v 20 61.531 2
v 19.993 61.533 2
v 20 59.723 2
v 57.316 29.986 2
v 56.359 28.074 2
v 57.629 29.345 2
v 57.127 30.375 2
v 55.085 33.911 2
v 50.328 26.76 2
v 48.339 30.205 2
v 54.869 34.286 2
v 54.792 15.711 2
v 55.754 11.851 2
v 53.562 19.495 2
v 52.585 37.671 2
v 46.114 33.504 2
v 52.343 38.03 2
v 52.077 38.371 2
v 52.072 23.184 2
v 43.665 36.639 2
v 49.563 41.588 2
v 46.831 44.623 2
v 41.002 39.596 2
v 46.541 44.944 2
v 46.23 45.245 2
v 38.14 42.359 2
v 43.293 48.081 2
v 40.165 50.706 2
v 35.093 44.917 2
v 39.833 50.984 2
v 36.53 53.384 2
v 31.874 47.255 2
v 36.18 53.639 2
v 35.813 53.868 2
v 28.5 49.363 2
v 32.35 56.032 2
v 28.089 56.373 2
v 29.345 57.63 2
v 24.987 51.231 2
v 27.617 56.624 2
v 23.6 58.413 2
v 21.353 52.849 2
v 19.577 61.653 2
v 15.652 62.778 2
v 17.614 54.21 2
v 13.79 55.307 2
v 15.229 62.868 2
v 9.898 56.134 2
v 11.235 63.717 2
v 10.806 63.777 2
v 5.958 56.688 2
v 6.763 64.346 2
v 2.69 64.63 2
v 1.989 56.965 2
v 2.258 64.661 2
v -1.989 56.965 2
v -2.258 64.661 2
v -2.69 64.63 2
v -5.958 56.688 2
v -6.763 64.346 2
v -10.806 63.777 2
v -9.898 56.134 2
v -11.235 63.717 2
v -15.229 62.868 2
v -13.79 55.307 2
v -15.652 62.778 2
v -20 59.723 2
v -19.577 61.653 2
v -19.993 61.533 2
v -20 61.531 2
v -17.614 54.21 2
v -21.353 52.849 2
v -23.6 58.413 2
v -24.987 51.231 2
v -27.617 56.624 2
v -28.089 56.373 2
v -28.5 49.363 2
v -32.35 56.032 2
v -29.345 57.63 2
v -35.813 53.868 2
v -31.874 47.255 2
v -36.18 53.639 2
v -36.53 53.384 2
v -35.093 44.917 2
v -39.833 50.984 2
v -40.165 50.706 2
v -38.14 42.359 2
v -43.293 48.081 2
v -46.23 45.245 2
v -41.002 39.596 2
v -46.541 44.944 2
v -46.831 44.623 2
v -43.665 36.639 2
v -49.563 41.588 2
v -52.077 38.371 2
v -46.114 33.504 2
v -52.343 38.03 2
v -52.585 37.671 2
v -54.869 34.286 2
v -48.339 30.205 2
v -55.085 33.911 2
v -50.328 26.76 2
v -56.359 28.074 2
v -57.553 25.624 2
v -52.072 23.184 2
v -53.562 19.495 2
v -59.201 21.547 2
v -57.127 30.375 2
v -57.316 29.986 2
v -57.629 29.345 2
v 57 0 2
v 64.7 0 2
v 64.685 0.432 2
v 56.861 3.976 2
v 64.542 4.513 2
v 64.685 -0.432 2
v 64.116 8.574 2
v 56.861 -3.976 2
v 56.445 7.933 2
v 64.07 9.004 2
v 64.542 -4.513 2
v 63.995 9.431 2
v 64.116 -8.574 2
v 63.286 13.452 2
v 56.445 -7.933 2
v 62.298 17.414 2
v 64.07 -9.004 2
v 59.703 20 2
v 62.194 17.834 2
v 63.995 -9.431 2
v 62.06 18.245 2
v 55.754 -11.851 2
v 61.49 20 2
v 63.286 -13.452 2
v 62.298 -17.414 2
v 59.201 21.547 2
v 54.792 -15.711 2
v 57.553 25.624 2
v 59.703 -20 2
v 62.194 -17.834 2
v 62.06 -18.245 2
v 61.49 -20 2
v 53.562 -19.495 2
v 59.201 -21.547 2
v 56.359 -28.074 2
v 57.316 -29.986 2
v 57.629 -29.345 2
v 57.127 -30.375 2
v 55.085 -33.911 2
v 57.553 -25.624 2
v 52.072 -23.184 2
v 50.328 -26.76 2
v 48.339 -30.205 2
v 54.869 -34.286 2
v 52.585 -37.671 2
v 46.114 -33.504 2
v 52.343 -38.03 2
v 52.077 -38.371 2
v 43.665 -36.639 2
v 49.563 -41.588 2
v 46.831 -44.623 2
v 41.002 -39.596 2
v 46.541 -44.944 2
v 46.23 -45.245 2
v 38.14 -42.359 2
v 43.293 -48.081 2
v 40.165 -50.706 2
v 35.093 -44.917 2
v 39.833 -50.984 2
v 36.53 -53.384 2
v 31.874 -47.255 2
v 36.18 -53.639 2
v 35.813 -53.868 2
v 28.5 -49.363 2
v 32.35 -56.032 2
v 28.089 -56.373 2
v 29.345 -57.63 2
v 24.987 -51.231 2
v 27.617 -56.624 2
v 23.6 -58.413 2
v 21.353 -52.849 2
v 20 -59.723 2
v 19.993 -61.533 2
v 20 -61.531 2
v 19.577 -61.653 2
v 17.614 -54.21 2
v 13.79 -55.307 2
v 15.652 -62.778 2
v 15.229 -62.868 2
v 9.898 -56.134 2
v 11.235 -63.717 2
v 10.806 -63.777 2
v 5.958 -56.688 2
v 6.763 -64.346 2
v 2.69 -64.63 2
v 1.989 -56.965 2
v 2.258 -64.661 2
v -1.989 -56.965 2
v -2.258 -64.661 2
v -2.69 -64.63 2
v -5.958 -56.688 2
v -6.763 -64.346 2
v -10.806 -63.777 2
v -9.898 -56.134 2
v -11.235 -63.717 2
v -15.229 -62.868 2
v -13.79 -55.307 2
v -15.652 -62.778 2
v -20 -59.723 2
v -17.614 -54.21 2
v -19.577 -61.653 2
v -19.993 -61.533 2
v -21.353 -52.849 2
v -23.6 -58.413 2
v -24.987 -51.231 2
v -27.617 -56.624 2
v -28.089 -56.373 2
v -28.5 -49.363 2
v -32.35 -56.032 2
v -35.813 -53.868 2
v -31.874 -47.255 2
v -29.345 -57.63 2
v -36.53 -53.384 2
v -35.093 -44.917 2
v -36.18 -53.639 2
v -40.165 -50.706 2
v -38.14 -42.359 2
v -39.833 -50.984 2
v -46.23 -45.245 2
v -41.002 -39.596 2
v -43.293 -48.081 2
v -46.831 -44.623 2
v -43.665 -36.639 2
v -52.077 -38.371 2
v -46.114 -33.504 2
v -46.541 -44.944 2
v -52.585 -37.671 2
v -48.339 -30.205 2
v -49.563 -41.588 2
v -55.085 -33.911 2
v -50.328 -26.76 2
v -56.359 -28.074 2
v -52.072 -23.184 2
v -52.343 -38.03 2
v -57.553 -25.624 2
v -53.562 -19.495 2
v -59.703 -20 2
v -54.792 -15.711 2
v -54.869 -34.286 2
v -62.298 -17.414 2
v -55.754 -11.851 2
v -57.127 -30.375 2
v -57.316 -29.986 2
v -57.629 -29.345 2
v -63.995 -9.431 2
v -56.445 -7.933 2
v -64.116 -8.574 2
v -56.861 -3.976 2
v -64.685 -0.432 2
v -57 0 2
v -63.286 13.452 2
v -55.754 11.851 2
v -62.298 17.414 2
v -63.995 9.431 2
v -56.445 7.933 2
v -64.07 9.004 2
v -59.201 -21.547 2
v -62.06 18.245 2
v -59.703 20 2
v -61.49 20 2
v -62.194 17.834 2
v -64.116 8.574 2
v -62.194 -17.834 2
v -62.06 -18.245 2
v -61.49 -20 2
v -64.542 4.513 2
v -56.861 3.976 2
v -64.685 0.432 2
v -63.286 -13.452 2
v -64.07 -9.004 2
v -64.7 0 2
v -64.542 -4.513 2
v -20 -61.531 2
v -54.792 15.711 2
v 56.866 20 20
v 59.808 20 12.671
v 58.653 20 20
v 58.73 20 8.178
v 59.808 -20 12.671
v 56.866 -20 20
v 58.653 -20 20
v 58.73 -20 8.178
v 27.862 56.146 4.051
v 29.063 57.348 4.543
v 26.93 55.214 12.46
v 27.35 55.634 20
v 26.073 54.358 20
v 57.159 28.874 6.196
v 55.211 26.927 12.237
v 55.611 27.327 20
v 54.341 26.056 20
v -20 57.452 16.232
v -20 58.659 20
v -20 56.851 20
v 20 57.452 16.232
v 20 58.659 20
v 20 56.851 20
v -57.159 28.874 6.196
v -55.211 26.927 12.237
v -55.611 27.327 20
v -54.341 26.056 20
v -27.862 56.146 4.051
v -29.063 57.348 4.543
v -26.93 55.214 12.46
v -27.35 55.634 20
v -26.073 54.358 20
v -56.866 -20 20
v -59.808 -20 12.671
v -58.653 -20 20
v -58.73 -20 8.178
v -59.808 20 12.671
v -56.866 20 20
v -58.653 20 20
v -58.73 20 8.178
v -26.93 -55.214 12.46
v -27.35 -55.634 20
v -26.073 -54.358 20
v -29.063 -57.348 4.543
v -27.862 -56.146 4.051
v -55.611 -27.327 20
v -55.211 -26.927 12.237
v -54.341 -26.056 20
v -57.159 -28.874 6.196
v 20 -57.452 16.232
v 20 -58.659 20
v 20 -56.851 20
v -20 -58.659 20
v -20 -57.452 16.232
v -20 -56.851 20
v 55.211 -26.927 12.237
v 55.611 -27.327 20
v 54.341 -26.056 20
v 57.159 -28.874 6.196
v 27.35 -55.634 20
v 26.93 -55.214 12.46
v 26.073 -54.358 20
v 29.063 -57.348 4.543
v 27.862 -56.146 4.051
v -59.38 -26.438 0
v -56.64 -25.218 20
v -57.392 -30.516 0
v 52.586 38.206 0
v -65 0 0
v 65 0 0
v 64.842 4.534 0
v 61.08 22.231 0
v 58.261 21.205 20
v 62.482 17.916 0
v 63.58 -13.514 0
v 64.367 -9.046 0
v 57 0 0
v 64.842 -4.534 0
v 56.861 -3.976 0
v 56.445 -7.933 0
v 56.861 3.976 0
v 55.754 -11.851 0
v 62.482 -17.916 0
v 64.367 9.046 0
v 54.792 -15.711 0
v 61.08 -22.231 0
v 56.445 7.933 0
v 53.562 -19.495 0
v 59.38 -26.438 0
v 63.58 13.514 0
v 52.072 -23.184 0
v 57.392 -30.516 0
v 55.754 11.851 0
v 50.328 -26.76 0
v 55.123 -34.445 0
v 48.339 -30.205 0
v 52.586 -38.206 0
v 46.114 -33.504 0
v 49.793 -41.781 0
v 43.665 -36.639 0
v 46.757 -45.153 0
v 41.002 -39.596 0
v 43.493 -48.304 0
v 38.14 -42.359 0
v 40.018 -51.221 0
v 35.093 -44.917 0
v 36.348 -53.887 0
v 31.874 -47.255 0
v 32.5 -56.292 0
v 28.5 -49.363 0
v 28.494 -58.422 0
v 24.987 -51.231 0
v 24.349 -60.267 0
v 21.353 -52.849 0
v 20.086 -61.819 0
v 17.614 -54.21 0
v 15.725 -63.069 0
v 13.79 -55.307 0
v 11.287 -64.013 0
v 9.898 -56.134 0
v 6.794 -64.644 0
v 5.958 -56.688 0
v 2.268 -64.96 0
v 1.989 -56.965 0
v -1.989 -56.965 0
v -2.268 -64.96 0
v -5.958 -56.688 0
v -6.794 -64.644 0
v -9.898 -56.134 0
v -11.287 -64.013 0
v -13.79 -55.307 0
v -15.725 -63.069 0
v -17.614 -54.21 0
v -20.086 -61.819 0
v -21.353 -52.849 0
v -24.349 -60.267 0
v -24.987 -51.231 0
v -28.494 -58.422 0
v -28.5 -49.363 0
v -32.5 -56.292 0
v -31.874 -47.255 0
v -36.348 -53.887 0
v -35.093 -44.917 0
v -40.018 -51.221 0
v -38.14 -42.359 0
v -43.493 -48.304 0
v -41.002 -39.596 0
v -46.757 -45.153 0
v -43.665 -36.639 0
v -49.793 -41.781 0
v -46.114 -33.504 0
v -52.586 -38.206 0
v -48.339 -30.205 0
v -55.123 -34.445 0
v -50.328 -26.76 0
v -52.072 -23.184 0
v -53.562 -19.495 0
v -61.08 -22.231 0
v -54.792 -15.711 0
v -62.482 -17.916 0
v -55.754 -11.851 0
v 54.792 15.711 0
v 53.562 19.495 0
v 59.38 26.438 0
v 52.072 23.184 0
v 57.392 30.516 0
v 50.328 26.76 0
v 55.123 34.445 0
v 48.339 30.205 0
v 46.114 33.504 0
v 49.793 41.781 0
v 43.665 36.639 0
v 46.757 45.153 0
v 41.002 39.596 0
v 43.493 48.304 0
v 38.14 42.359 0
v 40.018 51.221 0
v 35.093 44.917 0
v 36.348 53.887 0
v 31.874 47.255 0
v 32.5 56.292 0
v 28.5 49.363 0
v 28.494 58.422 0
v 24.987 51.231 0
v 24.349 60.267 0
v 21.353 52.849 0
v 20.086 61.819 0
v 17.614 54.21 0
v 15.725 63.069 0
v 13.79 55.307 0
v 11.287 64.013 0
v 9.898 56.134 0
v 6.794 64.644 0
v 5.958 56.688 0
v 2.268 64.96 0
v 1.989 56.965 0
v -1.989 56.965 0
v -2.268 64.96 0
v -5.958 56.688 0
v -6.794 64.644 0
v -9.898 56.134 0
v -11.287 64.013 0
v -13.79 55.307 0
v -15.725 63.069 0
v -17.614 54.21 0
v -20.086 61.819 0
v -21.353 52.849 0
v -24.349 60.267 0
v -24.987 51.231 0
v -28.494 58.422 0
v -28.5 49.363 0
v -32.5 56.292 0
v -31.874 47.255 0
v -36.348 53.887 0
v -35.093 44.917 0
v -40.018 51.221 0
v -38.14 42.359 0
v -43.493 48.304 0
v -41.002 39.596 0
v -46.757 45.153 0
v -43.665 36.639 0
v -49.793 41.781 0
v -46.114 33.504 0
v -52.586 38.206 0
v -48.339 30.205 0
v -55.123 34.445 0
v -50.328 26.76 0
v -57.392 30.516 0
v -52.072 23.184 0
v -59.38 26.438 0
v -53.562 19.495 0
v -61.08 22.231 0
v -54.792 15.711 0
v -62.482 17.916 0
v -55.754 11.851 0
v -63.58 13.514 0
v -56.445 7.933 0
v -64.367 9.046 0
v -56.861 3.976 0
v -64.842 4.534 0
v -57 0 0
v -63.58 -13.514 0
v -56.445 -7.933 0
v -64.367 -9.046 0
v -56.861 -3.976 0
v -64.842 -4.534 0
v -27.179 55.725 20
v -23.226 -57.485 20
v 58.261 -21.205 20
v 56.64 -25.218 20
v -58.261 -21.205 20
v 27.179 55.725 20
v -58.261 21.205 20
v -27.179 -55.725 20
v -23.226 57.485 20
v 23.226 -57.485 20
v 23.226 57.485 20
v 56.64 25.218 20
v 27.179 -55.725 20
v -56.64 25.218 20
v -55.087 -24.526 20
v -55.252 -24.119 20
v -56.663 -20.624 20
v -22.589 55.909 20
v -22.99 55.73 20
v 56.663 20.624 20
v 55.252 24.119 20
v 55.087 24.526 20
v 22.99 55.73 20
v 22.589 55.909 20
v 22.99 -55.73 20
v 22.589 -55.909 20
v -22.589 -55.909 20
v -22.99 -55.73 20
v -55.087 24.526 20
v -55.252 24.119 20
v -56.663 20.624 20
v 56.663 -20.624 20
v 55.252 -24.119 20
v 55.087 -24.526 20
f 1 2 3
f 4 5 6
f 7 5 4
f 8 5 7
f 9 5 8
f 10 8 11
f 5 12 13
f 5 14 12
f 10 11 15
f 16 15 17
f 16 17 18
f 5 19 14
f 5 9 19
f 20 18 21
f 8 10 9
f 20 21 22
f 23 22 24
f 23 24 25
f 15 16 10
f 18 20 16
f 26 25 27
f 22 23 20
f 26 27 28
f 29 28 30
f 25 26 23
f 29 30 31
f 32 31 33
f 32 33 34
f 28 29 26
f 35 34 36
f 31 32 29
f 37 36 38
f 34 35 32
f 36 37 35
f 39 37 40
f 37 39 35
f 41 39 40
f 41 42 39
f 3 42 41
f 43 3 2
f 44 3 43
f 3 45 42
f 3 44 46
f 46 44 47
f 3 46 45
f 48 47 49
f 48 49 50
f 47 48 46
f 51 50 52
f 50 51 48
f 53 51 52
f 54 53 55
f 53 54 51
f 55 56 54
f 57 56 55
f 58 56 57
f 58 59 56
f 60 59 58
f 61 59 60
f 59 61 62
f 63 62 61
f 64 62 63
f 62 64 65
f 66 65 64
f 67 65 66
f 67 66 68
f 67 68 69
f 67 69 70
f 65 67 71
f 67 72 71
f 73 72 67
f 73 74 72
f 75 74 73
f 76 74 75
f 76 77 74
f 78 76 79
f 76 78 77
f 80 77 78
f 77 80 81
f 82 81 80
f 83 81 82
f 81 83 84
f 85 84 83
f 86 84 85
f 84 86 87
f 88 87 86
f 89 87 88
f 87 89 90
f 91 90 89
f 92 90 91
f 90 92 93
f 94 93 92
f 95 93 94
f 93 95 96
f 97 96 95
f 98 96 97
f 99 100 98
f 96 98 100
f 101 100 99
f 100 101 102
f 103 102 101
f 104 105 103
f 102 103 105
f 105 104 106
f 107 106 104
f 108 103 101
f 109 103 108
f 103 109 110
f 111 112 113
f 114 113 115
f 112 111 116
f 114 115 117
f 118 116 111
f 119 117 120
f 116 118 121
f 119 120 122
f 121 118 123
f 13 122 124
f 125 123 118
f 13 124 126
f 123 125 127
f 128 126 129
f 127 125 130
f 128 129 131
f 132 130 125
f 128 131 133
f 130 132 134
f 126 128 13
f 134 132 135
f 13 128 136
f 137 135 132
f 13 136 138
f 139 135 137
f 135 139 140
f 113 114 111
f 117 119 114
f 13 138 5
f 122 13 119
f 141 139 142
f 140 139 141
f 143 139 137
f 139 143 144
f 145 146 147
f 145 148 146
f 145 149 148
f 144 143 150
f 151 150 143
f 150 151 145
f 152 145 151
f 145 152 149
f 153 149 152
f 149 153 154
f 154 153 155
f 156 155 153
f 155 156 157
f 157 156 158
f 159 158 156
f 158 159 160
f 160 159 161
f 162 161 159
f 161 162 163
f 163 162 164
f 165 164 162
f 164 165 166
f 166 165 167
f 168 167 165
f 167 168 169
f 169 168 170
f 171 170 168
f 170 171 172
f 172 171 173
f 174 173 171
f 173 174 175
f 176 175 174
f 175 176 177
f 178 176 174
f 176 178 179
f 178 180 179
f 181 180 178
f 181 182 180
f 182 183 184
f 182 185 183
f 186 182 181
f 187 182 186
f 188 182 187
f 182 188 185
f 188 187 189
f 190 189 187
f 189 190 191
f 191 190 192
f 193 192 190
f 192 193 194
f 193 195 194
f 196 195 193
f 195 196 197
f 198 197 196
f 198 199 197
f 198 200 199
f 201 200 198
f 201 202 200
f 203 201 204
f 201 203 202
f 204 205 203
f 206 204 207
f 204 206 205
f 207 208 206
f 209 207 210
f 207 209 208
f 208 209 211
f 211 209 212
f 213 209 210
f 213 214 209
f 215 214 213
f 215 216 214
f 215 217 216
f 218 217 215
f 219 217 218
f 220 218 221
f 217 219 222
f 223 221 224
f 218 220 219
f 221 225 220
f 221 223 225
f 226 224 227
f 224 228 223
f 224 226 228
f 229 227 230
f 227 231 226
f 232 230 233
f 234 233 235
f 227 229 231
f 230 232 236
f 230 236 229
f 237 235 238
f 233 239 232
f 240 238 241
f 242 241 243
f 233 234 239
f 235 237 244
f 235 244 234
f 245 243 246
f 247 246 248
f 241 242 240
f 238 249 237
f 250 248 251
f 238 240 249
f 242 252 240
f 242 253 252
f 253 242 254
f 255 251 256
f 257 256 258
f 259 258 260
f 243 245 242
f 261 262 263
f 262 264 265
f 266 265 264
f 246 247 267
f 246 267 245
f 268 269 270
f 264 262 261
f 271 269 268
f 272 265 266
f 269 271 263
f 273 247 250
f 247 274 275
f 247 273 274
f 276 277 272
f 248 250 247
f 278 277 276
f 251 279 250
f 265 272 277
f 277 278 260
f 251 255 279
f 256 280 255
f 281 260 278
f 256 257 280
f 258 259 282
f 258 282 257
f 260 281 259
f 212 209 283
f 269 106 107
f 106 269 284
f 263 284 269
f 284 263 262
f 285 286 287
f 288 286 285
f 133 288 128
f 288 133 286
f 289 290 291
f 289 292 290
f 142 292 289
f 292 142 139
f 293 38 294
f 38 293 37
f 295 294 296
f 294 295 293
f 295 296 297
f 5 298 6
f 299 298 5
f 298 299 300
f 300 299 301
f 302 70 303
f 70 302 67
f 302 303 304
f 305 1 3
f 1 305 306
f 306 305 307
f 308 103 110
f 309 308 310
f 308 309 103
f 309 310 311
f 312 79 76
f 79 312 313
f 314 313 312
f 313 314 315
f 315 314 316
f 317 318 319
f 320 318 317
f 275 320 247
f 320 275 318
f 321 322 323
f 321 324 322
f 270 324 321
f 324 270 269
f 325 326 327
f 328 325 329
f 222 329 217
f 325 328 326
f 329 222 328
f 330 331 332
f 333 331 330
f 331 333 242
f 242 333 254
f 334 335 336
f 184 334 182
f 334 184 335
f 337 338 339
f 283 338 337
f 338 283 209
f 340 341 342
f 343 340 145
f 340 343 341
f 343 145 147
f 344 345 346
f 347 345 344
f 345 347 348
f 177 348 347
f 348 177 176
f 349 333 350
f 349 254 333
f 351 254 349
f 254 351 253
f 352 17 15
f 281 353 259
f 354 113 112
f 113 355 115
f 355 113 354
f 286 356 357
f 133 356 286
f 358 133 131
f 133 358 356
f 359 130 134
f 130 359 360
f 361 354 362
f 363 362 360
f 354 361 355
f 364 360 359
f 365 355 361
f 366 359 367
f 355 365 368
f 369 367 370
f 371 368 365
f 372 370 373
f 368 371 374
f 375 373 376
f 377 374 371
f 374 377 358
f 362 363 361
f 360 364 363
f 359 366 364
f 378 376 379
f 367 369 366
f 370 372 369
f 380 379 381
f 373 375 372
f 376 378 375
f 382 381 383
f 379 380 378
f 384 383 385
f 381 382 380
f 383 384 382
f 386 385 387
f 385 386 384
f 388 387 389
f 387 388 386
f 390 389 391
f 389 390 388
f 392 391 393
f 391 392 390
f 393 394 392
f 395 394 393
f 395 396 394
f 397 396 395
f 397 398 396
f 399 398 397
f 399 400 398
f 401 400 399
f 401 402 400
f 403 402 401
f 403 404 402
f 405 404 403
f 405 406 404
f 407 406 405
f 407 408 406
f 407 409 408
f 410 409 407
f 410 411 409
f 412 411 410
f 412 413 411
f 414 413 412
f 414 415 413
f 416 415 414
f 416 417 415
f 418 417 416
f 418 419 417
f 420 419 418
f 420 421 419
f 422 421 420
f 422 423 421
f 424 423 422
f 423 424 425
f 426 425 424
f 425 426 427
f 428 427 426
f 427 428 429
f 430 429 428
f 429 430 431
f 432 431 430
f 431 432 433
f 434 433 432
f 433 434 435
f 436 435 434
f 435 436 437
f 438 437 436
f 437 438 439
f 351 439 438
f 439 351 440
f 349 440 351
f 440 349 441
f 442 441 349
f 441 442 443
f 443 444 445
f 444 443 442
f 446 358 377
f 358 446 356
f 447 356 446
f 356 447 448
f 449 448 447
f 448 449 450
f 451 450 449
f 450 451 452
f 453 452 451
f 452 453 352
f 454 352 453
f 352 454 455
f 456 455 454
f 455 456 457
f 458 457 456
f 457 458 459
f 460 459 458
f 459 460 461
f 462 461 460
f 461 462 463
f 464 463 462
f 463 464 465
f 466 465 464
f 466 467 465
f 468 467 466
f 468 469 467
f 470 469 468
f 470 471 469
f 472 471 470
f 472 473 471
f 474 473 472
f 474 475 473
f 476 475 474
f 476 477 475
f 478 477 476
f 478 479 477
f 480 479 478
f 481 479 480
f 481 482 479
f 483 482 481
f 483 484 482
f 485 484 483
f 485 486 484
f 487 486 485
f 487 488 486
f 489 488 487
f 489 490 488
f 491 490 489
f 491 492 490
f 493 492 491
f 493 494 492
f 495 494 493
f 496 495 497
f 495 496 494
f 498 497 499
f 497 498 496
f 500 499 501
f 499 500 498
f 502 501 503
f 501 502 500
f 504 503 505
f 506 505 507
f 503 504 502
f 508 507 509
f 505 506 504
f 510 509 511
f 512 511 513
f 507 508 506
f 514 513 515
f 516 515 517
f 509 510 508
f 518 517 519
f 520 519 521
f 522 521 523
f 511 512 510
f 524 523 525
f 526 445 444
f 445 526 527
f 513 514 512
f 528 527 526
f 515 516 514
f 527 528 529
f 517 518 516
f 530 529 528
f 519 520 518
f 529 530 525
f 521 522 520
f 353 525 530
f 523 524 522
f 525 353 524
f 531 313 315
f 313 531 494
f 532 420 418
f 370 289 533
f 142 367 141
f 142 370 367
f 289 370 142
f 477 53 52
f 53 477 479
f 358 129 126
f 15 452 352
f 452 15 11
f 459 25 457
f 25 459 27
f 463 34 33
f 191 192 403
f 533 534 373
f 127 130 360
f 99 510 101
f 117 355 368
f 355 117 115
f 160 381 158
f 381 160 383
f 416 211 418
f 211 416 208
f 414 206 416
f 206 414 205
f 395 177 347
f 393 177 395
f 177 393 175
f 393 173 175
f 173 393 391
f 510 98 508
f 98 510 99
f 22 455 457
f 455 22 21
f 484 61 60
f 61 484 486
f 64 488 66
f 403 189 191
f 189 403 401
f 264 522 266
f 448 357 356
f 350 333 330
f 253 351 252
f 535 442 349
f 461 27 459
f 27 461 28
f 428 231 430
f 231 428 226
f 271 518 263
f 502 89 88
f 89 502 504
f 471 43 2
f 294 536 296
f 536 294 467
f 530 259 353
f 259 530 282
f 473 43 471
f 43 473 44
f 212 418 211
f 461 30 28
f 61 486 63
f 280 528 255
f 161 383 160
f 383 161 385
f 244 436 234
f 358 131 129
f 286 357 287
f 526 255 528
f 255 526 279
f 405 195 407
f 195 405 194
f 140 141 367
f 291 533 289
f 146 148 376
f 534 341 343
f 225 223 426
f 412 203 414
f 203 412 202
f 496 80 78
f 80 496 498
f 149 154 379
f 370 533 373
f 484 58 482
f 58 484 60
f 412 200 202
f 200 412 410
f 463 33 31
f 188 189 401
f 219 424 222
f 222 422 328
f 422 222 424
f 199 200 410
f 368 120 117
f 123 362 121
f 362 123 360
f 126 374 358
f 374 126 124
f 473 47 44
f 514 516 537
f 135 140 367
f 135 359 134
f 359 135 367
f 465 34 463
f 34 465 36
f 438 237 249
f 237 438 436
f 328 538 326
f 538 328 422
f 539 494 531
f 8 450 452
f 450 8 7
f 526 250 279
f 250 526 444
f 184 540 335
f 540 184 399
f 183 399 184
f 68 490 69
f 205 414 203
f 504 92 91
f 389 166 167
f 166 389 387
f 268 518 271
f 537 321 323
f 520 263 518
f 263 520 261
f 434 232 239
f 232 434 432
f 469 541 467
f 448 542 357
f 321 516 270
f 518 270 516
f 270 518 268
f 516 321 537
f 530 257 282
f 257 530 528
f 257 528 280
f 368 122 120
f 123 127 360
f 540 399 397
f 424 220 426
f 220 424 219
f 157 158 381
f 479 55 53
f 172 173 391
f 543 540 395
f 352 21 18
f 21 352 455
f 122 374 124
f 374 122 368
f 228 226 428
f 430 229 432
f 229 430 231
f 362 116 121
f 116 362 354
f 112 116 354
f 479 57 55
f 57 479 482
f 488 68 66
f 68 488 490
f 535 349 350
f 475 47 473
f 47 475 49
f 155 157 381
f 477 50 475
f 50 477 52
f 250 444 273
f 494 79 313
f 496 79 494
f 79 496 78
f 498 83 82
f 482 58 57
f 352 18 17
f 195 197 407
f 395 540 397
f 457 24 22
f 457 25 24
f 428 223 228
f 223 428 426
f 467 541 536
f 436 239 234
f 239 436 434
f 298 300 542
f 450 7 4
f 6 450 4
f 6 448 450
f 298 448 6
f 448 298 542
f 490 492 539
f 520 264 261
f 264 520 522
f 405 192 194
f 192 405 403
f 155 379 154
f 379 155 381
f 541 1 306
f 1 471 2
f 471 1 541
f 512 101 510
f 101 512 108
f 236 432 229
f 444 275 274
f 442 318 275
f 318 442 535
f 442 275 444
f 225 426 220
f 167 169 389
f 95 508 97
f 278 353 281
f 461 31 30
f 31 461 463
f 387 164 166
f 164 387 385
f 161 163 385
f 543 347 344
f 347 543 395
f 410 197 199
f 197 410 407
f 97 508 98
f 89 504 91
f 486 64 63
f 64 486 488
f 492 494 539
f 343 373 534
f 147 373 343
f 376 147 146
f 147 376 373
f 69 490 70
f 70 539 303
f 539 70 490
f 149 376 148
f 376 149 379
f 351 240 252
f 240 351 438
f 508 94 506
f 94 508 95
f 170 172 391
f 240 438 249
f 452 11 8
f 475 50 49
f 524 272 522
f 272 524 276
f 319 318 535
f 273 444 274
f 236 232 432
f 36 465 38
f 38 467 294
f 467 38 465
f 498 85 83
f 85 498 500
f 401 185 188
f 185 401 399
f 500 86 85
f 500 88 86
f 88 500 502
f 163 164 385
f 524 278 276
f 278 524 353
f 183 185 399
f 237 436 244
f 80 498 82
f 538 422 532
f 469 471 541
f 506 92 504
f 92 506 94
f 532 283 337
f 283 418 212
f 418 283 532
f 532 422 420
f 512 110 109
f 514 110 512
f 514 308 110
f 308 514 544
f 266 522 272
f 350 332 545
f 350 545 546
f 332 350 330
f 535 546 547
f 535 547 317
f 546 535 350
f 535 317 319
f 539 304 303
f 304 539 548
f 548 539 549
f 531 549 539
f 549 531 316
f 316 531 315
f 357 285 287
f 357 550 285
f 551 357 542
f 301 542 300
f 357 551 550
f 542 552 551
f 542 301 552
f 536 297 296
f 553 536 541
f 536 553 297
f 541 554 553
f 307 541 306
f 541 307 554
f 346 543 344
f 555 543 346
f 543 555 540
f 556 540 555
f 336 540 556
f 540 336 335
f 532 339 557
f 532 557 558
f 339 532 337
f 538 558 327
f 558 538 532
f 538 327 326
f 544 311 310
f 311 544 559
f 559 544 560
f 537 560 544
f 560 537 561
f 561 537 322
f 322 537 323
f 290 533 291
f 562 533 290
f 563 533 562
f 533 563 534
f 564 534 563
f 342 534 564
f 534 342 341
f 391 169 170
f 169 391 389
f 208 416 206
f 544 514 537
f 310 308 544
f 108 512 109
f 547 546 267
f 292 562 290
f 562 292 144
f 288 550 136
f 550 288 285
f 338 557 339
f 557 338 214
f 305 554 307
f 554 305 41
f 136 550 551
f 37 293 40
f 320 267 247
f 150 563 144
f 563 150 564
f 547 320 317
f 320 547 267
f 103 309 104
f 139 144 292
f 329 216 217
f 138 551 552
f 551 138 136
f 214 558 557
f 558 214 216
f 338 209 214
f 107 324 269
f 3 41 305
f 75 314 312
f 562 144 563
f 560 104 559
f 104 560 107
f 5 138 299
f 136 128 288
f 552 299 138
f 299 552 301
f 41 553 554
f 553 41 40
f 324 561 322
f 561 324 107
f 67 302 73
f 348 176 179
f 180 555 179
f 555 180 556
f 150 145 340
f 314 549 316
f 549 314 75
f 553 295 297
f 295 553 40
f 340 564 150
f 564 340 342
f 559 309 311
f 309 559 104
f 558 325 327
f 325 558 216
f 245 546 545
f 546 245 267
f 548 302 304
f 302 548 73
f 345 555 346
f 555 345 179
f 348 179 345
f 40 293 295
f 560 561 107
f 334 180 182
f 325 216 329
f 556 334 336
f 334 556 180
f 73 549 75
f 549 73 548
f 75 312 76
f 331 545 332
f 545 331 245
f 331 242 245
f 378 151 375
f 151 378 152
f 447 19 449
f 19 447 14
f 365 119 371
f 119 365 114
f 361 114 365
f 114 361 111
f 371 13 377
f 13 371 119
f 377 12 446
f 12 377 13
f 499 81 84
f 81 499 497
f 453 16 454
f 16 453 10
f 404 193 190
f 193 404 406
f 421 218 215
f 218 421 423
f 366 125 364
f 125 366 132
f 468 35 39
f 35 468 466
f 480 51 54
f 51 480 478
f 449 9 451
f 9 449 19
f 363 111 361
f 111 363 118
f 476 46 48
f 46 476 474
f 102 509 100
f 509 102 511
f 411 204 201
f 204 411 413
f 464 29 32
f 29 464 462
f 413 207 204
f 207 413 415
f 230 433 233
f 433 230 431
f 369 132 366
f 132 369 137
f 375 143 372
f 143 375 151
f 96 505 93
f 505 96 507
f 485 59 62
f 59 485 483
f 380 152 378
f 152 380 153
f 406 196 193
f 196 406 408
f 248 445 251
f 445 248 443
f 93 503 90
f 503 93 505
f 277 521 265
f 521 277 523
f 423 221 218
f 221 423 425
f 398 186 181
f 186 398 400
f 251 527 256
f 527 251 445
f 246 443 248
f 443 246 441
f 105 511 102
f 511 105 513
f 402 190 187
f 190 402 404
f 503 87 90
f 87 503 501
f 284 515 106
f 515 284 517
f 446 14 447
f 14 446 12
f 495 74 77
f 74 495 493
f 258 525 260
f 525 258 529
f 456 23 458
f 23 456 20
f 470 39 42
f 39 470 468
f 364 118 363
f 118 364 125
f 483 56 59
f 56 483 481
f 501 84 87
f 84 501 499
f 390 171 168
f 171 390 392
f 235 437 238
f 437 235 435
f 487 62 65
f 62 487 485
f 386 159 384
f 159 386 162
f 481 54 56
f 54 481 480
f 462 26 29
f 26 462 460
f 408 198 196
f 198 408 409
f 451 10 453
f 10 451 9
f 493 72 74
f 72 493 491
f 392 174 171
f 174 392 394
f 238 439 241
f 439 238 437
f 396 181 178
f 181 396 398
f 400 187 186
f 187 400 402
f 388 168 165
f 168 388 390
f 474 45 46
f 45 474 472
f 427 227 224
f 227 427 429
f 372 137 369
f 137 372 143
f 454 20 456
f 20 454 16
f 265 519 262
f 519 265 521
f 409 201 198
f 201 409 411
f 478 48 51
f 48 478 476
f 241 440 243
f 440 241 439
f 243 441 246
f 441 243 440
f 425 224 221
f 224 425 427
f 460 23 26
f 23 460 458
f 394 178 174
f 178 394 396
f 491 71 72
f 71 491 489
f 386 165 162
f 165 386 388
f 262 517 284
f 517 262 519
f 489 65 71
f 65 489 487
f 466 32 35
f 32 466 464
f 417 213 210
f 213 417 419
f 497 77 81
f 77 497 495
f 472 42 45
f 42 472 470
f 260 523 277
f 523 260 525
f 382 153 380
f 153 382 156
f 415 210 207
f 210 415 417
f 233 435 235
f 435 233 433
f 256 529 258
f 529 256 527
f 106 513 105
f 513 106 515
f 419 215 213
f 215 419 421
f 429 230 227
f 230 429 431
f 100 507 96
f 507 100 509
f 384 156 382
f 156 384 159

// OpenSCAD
//
//
//  An extended lamp shade for:
//
//  "Sophie 1-Light Plug-in or Hardwire Wall Sconce, Chrome Gooseneck, 
//  Matte Rose, 6ft Clear Cord", Globe Electric 13064
//  Amazon ASIN B07JH4P8SY
//



Lamp_Lower_Dia = 130;
Lamp_Upper_Dia = 124;
Shade_Thickness = 2;
Lip_Thickness = 2;
Lip_Width = 8;
Height_Above = 20;

$fn = 90;

difference() {
    cylinder(d1=Lamp_Lower_Dia, d2=Lamp_Upper_Dia, h=Height_Above);
    translate([0,0,Lip_Thickness]) cylinder(d1=Lamp_Lower_Dia - (2*Shade_Thickness),
        d2=Lamp_Upper_Dia - (2*Shade_Thickness), h=Height_Above);
    cylinder(
        d1=Lamp_Lower_Dia - (2*Lip_Width),
        d2=Lamp_Lower_Dia - (2*Lip_Width), h=Height_Above, center=true);
    for (r=[0:45:360]) {
        rotate([0,0,r]) translate([64,0,Lip_Thickness+10]) cube([30,40,20], center=true);
    }
}
